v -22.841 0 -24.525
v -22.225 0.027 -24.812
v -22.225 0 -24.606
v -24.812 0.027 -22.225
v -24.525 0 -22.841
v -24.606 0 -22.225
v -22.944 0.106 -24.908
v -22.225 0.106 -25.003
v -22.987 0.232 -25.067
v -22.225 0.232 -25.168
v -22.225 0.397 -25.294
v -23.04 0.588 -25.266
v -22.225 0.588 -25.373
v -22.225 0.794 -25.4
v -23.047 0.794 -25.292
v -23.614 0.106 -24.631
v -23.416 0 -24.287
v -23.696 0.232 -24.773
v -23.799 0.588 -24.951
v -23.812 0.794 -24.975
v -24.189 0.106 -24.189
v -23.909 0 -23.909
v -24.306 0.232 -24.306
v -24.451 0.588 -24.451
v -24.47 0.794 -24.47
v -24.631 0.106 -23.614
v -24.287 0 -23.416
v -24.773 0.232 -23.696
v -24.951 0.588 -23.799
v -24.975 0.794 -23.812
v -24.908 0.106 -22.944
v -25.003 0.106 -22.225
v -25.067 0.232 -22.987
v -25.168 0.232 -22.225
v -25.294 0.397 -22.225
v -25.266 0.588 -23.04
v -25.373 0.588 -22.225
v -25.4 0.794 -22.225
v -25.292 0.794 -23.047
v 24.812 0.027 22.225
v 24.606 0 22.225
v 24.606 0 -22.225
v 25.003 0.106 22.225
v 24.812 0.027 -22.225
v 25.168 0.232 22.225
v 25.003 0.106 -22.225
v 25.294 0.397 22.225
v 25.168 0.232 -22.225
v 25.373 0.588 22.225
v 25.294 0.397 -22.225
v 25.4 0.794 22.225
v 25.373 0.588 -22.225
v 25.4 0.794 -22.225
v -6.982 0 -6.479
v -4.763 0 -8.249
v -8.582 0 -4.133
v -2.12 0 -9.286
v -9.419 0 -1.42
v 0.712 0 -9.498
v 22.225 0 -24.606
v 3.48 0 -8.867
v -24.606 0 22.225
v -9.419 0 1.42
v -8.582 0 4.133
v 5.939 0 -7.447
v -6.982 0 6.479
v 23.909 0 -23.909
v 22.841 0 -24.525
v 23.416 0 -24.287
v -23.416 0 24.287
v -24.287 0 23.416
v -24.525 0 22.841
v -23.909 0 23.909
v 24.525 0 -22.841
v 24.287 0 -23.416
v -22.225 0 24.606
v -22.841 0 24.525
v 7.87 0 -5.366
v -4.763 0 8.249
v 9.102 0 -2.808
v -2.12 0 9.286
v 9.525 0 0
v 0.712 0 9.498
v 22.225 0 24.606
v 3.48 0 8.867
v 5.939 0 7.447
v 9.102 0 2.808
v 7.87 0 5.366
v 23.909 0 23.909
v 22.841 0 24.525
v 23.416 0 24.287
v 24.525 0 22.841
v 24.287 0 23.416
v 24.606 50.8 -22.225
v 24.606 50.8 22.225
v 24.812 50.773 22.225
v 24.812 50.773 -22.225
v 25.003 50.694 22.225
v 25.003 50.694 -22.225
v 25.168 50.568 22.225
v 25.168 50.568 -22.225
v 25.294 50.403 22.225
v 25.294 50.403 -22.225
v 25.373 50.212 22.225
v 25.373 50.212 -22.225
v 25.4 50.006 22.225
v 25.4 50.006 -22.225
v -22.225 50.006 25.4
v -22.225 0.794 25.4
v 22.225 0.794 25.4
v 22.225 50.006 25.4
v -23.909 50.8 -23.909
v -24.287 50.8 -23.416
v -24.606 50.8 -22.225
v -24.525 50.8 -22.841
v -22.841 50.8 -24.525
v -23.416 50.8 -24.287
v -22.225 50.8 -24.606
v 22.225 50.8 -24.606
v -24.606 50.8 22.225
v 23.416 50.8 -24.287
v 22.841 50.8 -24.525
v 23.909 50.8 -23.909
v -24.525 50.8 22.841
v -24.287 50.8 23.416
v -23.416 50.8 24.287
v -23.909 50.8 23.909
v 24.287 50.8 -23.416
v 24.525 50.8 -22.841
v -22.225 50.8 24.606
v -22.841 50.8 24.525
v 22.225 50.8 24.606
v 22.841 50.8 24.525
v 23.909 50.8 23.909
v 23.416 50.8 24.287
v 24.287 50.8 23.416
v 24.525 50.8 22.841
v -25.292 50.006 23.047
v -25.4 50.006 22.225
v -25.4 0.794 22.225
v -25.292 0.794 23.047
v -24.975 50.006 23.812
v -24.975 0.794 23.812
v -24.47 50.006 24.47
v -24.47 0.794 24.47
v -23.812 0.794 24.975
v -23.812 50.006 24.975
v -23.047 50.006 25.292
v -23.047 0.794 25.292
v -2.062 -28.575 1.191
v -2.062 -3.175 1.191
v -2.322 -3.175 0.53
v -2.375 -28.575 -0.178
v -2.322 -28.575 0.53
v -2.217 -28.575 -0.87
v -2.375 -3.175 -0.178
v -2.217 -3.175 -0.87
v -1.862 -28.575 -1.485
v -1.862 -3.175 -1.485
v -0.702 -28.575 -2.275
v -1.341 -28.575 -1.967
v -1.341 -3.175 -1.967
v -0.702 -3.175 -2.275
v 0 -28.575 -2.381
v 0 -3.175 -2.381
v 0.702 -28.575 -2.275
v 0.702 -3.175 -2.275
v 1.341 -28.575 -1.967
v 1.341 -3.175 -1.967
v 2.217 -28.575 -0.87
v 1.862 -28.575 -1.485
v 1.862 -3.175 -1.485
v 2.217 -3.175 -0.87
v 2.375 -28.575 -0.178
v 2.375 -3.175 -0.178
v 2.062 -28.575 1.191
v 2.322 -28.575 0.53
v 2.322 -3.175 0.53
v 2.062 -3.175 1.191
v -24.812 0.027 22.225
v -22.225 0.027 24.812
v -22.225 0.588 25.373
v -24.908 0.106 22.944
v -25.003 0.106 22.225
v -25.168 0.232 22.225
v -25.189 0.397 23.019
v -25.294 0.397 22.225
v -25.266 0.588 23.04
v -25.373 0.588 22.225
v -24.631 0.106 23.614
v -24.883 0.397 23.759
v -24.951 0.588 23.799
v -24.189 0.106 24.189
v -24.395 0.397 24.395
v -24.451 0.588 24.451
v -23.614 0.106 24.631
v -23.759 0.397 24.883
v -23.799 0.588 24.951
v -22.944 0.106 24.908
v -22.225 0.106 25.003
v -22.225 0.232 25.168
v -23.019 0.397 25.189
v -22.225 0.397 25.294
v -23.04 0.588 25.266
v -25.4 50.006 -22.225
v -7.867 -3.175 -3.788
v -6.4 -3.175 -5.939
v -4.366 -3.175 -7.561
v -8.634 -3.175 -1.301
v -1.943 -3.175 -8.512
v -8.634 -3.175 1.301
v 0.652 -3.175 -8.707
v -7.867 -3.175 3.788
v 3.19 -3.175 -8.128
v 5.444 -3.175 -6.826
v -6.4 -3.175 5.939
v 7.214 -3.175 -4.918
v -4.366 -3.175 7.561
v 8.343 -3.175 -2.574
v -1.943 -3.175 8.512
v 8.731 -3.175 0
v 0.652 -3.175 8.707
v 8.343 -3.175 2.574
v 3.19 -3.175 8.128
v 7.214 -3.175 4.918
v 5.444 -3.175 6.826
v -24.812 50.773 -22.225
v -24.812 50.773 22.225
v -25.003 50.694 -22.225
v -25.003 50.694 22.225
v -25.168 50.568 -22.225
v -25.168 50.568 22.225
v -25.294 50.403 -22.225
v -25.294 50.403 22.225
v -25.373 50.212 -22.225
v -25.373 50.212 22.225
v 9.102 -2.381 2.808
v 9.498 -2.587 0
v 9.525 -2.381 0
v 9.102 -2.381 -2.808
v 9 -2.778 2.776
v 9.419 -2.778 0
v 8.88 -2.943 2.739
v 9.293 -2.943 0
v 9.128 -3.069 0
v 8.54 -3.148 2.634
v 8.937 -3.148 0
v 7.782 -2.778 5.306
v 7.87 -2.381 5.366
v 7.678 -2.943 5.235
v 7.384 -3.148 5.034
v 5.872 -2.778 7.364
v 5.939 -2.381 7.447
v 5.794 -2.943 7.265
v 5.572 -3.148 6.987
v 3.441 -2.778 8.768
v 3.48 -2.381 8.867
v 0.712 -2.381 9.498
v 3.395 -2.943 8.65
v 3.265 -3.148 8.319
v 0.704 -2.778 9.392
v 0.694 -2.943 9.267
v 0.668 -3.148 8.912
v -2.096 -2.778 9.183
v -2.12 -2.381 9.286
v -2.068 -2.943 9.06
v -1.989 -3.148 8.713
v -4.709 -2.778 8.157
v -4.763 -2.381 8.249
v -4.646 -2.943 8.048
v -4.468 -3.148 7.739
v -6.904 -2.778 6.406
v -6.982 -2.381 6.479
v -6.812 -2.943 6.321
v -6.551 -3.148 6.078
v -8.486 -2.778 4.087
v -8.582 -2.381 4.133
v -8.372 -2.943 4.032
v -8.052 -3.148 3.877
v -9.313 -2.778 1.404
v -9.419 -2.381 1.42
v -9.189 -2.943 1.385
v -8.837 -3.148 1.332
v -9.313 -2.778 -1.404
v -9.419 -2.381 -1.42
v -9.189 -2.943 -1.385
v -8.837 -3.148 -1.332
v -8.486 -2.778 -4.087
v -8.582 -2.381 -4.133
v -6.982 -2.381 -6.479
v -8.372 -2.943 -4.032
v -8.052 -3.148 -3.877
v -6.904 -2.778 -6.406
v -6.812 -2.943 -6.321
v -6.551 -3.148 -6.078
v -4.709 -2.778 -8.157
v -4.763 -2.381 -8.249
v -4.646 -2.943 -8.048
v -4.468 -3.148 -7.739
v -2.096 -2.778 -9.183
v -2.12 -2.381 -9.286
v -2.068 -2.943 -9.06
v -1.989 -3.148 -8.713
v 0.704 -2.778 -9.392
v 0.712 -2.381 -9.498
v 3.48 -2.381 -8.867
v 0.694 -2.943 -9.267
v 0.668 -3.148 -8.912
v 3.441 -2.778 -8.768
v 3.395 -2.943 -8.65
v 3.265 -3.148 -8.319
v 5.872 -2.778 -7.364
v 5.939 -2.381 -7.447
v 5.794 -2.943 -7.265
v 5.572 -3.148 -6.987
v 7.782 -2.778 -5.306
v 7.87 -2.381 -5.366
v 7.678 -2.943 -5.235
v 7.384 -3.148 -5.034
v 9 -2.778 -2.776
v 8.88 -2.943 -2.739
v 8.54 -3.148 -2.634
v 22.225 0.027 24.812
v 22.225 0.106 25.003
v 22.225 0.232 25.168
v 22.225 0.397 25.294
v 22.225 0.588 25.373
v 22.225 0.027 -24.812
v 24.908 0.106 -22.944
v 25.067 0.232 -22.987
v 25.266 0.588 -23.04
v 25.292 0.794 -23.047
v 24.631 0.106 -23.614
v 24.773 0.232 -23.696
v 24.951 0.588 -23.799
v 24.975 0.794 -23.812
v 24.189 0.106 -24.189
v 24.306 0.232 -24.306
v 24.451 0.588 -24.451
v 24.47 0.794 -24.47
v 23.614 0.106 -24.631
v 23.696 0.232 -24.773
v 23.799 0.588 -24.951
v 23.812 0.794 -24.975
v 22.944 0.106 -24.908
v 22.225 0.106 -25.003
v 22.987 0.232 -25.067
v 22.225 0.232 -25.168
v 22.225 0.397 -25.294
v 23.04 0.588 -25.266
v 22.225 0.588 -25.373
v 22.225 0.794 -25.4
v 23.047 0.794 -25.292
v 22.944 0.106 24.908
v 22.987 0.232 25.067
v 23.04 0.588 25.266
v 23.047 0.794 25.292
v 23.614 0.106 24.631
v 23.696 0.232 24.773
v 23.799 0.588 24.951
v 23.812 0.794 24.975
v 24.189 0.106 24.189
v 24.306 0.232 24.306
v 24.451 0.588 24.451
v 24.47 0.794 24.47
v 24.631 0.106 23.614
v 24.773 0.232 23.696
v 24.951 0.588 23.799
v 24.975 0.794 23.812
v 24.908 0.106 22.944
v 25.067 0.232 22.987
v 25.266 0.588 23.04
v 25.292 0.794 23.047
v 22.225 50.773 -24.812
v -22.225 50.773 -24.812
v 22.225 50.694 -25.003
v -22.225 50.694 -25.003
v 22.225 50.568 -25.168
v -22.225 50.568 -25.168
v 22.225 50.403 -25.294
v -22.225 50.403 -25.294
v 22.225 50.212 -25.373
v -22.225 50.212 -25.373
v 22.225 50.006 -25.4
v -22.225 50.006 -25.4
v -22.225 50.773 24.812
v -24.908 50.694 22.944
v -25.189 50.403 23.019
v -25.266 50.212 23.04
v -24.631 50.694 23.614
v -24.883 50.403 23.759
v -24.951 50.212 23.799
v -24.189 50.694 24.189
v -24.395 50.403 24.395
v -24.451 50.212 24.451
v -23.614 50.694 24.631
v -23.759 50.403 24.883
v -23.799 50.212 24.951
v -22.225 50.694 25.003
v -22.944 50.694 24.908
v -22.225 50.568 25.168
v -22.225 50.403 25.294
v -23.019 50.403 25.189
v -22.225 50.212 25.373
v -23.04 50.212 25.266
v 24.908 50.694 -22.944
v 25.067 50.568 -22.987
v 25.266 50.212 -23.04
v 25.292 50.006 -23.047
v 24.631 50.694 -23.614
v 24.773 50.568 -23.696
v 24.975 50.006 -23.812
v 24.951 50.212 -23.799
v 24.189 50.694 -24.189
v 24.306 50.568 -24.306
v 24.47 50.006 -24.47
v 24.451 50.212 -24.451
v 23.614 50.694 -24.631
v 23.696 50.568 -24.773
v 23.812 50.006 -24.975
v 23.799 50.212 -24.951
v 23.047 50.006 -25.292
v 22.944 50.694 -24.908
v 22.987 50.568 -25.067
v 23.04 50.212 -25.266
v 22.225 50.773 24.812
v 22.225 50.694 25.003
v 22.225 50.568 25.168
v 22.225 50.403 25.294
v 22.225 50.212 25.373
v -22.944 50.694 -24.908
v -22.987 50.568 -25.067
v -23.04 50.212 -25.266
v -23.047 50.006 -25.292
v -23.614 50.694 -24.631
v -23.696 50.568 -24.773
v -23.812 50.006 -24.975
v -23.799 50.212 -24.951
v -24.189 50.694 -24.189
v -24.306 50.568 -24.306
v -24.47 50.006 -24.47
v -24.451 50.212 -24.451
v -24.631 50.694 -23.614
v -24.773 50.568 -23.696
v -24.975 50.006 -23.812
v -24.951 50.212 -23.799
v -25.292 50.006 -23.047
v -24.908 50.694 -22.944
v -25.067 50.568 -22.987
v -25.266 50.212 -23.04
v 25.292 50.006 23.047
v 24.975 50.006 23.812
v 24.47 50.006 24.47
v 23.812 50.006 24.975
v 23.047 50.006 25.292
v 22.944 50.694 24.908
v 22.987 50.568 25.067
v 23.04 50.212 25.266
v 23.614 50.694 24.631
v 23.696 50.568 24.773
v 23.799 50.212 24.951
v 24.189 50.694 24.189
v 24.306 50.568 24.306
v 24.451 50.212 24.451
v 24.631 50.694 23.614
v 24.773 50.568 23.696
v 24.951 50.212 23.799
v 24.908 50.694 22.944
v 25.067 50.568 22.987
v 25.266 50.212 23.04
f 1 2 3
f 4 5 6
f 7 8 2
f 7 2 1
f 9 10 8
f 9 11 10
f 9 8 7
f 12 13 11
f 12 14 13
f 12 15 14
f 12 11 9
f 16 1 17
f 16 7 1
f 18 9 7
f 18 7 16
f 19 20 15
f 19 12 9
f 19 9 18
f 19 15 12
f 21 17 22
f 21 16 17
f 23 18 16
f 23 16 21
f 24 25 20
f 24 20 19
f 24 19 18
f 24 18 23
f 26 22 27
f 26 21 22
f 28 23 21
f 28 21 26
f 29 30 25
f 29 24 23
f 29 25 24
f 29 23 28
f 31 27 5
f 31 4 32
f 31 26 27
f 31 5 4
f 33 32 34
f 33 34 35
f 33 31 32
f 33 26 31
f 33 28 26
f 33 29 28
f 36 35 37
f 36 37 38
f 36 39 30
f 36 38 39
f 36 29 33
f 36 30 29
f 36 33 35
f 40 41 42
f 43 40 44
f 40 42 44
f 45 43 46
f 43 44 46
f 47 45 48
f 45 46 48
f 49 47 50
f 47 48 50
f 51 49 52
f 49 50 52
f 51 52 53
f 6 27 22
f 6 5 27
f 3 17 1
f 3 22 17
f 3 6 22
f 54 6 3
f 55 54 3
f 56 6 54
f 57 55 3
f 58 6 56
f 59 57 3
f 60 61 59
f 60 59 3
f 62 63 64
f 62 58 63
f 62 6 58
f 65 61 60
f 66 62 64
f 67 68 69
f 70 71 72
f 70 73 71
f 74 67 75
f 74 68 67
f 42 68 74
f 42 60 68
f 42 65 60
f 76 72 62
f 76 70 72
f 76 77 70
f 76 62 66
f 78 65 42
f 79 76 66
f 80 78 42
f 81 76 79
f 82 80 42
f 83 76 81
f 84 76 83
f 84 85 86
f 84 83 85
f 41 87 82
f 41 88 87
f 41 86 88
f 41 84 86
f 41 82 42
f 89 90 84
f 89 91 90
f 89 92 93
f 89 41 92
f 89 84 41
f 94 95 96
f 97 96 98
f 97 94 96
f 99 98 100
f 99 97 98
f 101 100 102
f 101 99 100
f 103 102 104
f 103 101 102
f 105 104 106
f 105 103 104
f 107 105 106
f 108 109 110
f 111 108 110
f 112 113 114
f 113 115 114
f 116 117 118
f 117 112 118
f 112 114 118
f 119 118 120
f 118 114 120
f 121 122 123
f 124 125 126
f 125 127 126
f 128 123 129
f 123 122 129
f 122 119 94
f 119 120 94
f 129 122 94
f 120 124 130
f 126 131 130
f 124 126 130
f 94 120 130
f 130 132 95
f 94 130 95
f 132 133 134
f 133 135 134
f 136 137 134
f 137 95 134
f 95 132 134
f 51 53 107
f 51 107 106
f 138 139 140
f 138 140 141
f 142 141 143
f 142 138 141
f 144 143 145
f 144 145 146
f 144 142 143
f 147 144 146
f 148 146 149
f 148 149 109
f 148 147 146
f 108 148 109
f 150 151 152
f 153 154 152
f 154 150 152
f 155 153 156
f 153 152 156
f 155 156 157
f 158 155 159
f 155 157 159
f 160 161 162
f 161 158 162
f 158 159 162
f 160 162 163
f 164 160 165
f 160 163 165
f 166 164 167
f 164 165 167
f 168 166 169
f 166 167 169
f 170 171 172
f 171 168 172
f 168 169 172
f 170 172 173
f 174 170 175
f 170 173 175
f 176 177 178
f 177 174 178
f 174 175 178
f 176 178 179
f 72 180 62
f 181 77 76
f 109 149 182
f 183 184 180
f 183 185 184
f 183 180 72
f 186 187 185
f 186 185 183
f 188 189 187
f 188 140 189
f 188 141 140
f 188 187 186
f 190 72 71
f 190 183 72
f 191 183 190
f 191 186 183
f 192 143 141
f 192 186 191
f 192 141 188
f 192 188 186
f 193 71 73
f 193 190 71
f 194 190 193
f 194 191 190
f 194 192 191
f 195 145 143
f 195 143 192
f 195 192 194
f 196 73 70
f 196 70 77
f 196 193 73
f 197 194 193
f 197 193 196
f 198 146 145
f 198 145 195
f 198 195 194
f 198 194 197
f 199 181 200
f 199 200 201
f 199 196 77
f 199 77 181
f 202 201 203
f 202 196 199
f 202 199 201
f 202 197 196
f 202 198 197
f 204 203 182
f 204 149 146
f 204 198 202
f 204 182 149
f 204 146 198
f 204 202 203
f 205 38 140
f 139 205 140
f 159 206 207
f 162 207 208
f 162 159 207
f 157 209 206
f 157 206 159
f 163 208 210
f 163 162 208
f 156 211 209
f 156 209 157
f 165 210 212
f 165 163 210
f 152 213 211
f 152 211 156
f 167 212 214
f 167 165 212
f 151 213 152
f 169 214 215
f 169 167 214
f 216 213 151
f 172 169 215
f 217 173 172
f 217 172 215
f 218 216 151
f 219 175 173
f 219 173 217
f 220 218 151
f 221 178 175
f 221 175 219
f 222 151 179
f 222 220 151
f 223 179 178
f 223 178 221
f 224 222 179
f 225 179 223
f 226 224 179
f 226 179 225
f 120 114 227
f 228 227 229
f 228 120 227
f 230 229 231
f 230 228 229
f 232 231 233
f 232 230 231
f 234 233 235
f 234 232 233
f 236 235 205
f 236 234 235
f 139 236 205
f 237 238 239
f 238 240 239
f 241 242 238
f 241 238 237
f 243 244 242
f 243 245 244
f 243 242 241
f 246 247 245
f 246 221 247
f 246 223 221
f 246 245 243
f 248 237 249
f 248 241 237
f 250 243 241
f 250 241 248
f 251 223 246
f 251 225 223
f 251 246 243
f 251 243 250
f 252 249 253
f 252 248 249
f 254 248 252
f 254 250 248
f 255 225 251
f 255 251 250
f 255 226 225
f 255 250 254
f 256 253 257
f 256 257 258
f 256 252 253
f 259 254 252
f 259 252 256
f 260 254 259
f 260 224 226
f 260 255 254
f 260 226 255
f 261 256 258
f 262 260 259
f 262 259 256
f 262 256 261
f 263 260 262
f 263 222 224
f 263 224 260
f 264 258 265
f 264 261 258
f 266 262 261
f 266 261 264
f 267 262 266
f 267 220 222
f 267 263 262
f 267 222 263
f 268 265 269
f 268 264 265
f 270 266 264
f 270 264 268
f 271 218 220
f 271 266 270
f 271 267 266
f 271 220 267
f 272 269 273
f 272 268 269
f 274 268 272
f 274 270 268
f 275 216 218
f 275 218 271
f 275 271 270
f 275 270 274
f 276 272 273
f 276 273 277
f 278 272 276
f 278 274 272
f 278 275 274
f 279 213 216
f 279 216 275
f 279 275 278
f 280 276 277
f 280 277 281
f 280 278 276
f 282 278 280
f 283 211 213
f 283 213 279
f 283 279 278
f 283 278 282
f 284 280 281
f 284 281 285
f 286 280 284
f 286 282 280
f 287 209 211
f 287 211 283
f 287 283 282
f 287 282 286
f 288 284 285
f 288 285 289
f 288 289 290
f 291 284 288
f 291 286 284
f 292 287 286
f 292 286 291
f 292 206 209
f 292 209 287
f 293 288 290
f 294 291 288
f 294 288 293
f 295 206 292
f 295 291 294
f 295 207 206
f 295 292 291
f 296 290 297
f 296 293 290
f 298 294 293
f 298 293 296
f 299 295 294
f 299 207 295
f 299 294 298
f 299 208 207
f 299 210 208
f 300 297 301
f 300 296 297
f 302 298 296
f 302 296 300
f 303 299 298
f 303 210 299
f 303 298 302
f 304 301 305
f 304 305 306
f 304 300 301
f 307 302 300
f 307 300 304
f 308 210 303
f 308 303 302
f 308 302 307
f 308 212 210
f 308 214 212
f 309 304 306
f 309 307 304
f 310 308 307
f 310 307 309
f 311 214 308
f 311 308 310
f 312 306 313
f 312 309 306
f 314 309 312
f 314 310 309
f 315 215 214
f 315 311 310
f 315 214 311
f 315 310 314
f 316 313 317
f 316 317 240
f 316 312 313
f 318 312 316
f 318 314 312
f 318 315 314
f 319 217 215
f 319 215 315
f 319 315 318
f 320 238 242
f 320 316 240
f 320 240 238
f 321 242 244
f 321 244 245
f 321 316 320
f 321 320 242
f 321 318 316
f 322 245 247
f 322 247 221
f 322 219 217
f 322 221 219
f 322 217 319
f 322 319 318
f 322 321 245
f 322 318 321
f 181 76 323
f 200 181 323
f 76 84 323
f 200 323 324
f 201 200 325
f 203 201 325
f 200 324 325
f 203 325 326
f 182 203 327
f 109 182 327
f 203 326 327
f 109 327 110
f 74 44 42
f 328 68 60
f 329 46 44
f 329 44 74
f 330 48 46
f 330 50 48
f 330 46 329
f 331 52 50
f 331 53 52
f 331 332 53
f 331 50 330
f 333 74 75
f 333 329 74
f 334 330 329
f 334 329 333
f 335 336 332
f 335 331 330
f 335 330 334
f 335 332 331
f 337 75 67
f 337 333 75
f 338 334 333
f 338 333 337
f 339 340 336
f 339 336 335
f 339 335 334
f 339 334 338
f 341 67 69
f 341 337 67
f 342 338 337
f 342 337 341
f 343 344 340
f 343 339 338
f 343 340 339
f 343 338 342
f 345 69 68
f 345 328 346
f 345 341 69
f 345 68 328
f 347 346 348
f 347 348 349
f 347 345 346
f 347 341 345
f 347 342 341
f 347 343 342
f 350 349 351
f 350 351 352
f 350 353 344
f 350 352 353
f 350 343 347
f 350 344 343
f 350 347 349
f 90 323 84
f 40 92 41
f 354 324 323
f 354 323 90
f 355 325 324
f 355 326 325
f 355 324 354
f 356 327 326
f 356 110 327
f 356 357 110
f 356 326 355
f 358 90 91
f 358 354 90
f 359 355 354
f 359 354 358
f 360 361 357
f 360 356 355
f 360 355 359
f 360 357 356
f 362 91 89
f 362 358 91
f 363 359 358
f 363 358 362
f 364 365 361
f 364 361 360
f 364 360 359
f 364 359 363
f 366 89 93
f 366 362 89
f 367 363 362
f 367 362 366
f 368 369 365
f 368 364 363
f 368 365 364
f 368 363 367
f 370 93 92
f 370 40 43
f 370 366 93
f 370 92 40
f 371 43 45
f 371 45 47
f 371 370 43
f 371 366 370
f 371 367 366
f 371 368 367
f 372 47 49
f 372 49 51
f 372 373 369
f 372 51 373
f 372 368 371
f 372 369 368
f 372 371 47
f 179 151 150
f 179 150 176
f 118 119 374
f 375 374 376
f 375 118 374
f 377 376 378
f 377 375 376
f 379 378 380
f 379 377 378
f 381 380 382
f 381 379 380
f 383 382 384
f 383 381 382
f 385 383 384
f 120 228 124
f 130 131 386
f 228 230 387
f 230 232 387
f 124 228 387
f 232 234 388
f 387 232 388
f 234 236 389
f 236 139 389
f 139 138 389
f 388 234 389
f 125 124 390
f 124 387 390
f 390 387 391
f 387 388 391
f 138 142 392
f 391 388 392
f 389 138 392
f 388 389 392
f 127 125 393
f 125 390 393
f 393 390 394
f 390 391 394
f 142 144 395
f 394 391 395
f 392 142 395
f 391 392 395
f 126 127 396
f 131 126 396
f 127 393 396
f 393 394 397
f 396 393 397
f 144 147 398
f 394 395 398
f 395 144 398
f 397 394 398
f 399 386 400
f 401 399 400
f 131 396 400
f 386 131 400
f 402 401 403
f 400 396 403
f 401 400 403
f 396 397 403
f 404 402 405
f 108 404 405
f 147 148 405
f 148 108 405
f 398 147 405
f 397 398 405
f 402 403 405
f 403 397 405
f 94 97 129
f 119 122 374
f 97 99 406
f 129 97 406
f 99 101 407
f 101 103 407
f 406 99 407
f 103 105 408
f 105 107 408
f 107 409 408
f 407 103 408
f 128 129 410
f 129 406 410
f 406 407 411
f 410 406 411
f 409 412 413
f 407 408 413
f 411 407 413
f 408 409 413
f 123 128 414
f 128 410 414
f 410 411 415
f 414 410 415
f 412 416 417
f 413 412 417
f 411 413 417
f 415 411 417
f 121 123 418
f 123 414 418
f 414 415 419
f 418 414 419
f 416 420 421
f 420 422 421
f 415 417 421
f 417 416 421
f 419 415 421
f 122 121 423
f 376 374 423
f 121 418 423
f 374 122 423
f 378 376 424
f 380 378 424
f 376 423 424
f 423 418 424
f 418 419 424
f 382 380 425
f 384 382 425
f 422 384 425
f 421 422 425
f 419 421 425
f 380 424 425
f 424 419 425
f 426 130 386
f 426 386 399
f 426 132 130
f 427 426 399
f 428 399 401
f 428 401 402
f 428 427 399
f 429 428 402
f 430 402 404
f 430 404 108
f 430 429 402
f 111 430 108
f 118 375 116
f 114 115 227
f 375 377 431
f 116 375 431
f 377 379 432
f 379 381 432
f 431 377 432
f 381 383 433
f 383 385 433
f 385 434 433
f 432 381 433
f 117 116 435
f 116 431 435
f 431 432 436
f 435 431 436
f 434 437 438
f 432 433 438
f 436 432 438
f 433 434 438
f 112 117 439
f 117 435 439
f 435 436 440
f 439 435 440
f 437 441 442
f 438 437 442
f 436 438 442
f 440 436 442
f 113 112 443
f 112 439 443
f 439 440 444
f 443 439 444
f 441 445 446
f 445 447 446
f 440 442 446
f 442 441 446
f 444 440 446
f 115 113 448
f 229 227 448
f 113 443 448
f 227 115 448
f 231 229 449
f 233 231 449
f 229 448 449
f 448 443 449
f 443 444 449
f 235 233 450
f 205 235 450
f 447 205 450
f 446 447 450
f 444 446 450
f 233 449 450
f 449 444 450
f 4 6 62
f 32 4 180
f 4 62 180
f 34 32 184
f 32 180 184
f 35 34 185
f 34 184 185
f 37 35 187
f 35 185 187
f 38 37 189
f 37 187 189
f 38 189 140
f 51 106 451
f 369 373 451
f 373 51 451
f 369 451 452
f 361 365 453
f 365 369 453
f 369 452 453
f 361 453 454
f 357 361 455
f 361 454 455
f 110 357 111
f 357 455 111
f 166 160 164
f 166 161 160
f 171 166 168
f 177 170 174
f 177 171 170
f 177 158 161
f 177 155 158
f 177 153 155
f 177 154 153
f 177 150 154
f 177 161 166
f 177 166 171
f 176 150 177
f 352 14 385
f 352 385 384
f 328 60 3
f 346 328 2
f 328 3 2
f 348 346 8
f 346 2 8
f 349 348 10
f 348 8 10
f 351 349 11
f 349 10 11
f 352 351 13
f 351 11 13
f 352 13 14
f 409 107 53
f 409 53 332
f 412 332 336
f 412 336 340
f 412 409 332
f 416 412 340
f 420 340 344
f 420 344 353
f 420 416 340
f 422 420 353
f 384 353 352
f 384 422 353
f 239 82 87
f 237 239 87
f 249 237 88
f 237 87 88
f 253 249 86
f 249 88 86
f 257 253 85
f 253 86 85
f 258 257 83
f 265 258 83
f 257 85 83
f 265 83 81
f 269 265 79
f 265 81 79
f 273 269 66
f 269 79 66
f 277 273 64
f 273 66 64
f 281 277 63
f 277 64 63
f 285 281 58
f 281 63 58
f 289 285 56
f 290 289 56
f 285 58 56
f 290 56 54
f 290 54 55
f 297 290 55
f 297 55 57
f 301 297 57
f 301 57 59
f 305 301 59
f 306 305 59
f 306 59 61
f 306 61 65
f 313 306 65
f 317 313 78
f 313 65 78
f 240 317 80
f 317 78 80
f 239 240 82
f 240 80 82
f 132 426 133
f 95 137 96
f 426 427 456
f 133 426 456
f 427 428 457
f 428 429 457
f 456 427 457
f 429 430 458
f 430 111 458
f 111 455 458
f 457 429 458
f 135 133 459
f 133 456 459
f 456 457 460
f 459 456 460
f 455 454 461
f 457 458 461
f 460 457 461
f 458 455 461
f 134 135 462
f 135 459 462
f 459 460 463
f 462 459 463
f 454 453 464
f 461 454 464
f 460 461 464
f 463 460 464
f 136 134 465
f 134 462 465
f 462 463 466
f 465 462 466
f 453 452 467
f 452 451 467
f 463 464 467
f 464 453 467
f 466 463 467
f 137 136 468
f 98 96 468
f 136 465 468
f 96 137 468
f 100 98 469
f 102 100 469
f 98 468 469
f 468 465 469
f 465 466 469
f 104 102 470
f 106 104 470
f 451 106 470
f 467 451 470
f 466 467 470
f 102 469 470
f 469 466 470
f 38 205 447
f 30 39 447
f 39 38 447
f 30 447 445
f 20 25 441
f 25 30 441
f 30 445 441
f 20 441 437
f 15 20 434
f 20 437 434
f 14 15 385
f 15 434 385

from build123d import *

# Parameters (mm, degrees)
F0_W     = 50.8
F0_H     = 50.8
F0_R     = 9.525
F1_DEPTH = 50.8
F2_DEPTH = 3.175
F3_R     = 2.38125
F4_DEPTH = 25.4
F5_W     = 4.124446
F5_H     = 1.190625
F6_DEPTH = 25.4
F7_R     = 3.175
F8_R     = 0.79375


with BuildPart() as f1:
    # F0 (on Front) → F1 (new body)
    with BuildSketch(Plane.XZ):
        Rectangle(F0_W, F0_H)
        Circle(F0_R, mode=Mode.SUBTRACT)
        Circle(F0_R)
    extrude(amount=-F1_DEPTH)

    # F0 (on Front) → F2 (join)
    with BuildSketch(Plane.XZ):
        Circle(F0_R)
    extrude(amount=F2_DEPTH)

    # F3 (on face) → F4 (join)
    with BuildSketch(Plane.XZ.offset(3.175)):
        Circle(F3_R)
    extrude(amount=F4_DEPTH)

    # F5 (on face) → F6 (cut, through all)
    with BuildSketch(Plane.XZ.offset(28.575)):
        with Locations((0, 1.785938)):
            Rectangle(F5_W, F5_H)
    extrude(amount=-F6_DEPTH, mode=Mode.SUBTRACT)

    # F7
    f7_edges = [f1.edges().sort_by_distance(p)[0] for p in [
        (25.4, 25.4, 25.4),
        (25.4, 25.4, -25.4),
        (-25.4, 25.4, 25.4),
        (-25.4, 25.4, -25.4),
    ]]
    fillet(f7_edges, radius=F7_R)

    # F8
    f8_edges = [f1.edges().sort_by_distance(p)[0] for p in [
        (0, 0, 25.4),
        (0, 50.8, 25.4),
        (-9.525, -3.175, 0),
    ]]
    fillet(f8_edges, radius=F8_R)


solid = f1.part
